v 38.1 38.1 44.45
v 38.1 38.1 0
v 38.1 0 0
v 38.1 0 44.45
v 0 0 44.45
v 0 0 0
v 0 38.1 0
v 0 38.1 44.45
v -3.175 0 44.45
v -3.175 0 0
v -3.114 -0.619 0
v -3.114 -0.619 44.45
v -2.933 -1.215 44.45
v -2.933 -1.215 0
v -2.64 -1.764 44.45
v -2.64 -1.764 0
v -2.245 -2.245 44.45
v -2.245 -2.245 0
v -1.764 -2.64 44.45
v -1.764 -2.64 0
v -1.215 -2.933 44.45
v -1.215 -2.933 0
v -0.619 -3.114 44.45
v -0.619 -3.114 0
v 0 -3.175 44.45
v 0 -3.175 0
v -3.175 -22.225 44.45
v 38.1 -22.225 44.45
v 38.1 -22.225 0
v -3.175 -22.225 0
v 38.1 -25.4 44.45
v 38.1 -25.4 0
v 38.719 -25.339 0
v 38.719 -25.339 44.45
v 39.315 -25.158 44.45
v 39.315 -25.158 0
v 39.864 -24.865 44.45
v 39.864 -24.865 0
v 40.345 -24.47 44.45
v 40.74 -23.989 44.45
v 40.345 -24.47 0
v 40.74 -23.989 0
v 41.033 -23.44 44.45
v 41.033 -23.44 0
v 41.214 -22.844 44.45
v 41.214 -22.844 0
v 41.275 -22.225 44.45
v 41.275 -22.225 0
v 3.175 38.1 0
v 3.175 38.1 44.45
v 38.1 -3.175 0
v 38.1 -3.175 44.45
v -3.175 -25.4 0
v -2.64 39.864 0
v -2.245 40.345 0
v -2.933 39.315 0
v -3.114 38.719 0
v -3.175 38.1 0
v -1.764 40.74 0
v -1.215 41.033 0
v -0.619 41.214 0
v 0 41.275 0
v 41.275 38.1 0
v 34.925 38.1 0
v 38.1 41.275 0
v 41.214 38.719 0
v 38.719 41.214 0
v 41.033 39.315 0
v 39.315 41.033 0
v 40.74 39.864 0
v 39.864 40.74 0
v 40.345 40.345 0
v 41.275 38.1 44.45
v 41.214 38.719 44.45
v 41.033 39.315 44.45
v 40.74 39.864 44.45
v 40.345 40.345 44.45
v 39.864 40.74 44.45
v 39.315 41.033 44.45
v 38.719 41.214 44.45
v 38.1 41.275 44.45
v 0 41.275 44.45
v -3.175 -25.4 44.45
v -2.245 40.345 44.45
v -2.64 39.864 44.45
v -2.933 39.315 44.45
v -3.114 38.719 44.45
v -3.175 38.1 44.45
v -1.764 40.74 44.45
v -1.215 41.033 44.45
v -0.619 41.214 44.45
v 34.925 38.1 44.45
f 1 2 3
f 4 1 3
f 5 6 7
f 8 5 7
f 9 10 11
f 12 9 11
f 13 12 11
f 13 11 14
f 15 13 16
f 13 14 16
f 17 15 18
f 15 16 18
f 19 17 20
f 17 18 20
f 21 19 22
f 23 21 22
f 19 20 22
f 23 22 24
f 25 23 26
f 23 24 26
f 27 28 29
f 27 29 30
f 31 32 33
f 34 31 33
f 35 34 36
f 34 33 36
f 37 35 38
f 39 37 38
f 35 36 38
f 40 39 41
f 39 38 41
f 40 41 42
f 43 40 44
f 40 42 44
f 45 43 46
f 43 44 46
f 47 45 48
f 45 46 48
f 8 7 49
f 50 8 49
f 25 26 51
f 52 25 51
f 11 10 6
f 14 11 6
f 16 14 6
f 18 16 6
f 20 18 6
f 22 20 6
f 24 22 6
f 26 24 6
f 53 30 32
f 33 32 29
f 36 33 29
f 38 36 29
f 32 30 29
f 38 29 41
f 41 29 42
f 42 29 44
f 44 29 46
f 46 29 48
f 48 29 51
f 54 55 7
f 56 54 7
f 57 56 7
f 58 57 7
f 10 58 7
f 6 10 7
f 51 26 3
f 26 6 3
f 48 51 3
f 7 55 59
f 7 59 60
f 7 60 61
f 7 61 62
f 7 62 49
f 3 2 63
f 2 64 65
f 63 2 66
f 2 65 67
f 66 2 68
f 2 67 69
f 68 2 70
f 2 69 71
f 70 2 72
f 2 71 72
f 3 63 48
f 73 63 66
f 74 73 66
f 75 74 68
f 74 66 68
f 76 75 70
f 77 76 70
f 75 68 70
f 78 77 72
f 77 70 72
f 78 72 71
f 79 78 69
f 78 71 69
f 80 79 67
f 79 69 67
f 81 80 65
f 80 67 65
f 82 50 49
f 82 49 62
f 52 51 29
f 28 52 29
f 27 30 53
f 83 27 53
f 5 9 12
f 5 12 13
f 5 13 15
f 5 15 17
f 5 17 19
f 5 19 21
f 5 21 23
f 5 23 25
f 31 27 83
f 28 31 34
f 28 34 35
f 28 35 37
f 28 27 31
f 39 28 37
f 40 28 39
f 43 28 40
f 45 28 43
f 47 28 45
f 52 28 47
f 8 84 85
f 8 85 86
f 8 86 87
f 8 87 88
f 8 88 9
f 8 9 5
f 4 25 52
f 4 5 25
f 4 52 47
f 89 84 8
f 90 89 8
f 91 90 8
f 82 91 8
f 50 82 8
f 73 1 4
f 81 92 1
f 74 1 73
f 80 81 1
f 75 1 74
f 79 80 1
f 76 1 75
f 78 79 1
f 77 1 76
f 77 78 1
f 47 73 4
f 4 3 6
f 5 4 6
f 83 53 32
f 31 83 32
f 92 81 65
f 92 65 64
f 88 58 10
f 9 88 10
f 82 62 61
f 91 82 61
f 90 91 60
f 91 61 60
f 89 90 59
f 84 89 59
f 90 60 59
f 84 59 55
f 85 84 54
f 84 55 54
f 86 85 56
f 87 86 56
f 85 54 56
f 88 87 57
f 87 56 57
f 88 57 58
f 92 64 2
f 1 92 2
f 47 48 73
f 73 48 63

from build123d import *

# Parameters (mm, degrees)
F1_DEPTH = 44.45


with BuildPart() as f1:
    # F0 (on Top) → F1 (new body)
    with BuildSketch(Plane.XY):
        with BuildLine():
            Line((38.1, 0), (0, 0))
            Line((0, 0), (0, 38.1))
            Line((0, 38.1), (3.175, 38.1))
            Line((3.175, 38.1), (0, 41.275))
            ThreePointArc((0, 41.275), (-2.245064, 40.345064), (-3.175, 38.1))
            Line((-3.175, 38.1), (-3.175, 0))
            ThreePointArc((-3.175, 0), (-2.245064, -2.245064), (0, -3.175))
            Line((0, -3.175), (38.1, -3.175))
            Line((38.1, -3.175), (38.1, -22.225))
            Line((38.1, -22.225), (-3.175, -22.225))
            Line((-3.175, -22.225), (-3.175, -25.4))
            Line((-3.175, -25.4), (38.1, -25.4))
            ThreePointArc((38.1, -25.4), (40.345064, -24.470064), (41.275, -22.225))
            Line((41.275, -22.225), (41.275, -3.175))
            Line((41.275, -3.175), (41.275, 38.1))
            ThreePointArc((41.275, 38.1), (40.345064, 40.345064), (38.1, 41.275))
            Line((38.1, 41.275), (34.925, 38.1))
            Line((34.925, 38.1), (38.1, 38.1))
            Line((38.1, 38.1), (38.1, 0))
        make_face()
    extrude(amount=F1_DEPTH)


solid = f1.part
